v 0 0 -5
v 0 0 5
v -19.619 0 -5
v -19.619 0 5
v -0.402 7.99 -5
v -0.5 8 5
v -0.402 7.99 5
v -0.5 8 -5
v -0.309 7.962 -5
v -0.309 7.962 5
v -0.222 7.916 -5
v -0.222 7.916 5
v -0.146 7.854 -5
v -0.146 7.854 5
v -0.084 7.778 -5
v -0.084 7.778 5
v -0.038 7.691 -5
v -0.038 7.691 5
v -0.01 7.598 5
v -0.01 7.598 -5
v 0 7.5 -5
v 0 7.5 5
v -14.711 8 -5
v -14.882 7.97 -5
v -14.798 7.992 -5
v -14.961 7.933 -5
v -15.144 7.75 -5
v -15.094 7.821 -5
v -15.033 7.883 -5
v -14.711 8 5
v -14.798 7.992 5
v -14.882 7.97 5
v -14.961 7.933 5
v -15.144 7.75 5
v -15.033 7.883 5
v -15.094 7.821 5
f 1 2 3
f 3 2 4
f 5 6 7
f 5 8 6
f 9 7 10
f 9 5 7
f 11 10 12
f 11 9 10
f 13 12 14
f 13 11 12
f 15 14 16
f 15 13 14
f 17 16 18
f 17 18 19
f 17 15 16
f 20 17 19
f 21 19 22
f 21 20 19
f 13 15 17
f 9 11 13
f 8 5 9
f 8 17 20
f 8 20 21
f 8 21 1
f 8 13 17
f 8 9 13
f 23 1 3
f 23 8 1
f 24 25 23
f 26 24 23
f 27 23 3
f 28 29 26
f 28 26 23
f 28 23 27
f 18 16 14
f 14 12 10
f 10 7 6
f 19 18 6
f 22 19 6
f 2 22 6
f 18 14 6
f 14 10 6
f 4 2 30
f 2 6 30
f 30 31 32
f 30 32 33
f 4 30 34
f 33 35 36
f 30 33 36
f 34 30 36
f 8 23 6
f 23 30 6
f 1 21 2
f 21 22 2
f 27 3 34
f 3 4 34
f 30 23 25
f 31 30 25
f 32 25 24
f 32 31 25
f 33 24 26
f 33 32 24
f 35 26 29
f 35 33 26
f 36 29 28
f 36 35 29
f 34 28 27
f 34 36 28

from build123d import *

# Parameters (mm, degrees)
BOSS_EXTRU_1_DEPTH = 5
CONG_1_R           = 0.5


with BuildPart() as part:
    # Esquisse1 → Boss.-Extru.1 (new, symmetric)
    with BuildSketch(Plane.XY):
        Polygon((-15, 8), (0, 8), (0, 0), (-19.618802154, 0), align=None)
    extrude(amount=BOSS_EXTRU_1_DEPTH, both=True)

    # Congé1
    cong_1_edges = [part.edges().sort_by_distance(p)[0] for p in [
        (-15, 8, 0),
        (0, 8, 0),
    ]]
    fillet(cong_1_edges, radius=CONG_1_R)


solid = part.part
